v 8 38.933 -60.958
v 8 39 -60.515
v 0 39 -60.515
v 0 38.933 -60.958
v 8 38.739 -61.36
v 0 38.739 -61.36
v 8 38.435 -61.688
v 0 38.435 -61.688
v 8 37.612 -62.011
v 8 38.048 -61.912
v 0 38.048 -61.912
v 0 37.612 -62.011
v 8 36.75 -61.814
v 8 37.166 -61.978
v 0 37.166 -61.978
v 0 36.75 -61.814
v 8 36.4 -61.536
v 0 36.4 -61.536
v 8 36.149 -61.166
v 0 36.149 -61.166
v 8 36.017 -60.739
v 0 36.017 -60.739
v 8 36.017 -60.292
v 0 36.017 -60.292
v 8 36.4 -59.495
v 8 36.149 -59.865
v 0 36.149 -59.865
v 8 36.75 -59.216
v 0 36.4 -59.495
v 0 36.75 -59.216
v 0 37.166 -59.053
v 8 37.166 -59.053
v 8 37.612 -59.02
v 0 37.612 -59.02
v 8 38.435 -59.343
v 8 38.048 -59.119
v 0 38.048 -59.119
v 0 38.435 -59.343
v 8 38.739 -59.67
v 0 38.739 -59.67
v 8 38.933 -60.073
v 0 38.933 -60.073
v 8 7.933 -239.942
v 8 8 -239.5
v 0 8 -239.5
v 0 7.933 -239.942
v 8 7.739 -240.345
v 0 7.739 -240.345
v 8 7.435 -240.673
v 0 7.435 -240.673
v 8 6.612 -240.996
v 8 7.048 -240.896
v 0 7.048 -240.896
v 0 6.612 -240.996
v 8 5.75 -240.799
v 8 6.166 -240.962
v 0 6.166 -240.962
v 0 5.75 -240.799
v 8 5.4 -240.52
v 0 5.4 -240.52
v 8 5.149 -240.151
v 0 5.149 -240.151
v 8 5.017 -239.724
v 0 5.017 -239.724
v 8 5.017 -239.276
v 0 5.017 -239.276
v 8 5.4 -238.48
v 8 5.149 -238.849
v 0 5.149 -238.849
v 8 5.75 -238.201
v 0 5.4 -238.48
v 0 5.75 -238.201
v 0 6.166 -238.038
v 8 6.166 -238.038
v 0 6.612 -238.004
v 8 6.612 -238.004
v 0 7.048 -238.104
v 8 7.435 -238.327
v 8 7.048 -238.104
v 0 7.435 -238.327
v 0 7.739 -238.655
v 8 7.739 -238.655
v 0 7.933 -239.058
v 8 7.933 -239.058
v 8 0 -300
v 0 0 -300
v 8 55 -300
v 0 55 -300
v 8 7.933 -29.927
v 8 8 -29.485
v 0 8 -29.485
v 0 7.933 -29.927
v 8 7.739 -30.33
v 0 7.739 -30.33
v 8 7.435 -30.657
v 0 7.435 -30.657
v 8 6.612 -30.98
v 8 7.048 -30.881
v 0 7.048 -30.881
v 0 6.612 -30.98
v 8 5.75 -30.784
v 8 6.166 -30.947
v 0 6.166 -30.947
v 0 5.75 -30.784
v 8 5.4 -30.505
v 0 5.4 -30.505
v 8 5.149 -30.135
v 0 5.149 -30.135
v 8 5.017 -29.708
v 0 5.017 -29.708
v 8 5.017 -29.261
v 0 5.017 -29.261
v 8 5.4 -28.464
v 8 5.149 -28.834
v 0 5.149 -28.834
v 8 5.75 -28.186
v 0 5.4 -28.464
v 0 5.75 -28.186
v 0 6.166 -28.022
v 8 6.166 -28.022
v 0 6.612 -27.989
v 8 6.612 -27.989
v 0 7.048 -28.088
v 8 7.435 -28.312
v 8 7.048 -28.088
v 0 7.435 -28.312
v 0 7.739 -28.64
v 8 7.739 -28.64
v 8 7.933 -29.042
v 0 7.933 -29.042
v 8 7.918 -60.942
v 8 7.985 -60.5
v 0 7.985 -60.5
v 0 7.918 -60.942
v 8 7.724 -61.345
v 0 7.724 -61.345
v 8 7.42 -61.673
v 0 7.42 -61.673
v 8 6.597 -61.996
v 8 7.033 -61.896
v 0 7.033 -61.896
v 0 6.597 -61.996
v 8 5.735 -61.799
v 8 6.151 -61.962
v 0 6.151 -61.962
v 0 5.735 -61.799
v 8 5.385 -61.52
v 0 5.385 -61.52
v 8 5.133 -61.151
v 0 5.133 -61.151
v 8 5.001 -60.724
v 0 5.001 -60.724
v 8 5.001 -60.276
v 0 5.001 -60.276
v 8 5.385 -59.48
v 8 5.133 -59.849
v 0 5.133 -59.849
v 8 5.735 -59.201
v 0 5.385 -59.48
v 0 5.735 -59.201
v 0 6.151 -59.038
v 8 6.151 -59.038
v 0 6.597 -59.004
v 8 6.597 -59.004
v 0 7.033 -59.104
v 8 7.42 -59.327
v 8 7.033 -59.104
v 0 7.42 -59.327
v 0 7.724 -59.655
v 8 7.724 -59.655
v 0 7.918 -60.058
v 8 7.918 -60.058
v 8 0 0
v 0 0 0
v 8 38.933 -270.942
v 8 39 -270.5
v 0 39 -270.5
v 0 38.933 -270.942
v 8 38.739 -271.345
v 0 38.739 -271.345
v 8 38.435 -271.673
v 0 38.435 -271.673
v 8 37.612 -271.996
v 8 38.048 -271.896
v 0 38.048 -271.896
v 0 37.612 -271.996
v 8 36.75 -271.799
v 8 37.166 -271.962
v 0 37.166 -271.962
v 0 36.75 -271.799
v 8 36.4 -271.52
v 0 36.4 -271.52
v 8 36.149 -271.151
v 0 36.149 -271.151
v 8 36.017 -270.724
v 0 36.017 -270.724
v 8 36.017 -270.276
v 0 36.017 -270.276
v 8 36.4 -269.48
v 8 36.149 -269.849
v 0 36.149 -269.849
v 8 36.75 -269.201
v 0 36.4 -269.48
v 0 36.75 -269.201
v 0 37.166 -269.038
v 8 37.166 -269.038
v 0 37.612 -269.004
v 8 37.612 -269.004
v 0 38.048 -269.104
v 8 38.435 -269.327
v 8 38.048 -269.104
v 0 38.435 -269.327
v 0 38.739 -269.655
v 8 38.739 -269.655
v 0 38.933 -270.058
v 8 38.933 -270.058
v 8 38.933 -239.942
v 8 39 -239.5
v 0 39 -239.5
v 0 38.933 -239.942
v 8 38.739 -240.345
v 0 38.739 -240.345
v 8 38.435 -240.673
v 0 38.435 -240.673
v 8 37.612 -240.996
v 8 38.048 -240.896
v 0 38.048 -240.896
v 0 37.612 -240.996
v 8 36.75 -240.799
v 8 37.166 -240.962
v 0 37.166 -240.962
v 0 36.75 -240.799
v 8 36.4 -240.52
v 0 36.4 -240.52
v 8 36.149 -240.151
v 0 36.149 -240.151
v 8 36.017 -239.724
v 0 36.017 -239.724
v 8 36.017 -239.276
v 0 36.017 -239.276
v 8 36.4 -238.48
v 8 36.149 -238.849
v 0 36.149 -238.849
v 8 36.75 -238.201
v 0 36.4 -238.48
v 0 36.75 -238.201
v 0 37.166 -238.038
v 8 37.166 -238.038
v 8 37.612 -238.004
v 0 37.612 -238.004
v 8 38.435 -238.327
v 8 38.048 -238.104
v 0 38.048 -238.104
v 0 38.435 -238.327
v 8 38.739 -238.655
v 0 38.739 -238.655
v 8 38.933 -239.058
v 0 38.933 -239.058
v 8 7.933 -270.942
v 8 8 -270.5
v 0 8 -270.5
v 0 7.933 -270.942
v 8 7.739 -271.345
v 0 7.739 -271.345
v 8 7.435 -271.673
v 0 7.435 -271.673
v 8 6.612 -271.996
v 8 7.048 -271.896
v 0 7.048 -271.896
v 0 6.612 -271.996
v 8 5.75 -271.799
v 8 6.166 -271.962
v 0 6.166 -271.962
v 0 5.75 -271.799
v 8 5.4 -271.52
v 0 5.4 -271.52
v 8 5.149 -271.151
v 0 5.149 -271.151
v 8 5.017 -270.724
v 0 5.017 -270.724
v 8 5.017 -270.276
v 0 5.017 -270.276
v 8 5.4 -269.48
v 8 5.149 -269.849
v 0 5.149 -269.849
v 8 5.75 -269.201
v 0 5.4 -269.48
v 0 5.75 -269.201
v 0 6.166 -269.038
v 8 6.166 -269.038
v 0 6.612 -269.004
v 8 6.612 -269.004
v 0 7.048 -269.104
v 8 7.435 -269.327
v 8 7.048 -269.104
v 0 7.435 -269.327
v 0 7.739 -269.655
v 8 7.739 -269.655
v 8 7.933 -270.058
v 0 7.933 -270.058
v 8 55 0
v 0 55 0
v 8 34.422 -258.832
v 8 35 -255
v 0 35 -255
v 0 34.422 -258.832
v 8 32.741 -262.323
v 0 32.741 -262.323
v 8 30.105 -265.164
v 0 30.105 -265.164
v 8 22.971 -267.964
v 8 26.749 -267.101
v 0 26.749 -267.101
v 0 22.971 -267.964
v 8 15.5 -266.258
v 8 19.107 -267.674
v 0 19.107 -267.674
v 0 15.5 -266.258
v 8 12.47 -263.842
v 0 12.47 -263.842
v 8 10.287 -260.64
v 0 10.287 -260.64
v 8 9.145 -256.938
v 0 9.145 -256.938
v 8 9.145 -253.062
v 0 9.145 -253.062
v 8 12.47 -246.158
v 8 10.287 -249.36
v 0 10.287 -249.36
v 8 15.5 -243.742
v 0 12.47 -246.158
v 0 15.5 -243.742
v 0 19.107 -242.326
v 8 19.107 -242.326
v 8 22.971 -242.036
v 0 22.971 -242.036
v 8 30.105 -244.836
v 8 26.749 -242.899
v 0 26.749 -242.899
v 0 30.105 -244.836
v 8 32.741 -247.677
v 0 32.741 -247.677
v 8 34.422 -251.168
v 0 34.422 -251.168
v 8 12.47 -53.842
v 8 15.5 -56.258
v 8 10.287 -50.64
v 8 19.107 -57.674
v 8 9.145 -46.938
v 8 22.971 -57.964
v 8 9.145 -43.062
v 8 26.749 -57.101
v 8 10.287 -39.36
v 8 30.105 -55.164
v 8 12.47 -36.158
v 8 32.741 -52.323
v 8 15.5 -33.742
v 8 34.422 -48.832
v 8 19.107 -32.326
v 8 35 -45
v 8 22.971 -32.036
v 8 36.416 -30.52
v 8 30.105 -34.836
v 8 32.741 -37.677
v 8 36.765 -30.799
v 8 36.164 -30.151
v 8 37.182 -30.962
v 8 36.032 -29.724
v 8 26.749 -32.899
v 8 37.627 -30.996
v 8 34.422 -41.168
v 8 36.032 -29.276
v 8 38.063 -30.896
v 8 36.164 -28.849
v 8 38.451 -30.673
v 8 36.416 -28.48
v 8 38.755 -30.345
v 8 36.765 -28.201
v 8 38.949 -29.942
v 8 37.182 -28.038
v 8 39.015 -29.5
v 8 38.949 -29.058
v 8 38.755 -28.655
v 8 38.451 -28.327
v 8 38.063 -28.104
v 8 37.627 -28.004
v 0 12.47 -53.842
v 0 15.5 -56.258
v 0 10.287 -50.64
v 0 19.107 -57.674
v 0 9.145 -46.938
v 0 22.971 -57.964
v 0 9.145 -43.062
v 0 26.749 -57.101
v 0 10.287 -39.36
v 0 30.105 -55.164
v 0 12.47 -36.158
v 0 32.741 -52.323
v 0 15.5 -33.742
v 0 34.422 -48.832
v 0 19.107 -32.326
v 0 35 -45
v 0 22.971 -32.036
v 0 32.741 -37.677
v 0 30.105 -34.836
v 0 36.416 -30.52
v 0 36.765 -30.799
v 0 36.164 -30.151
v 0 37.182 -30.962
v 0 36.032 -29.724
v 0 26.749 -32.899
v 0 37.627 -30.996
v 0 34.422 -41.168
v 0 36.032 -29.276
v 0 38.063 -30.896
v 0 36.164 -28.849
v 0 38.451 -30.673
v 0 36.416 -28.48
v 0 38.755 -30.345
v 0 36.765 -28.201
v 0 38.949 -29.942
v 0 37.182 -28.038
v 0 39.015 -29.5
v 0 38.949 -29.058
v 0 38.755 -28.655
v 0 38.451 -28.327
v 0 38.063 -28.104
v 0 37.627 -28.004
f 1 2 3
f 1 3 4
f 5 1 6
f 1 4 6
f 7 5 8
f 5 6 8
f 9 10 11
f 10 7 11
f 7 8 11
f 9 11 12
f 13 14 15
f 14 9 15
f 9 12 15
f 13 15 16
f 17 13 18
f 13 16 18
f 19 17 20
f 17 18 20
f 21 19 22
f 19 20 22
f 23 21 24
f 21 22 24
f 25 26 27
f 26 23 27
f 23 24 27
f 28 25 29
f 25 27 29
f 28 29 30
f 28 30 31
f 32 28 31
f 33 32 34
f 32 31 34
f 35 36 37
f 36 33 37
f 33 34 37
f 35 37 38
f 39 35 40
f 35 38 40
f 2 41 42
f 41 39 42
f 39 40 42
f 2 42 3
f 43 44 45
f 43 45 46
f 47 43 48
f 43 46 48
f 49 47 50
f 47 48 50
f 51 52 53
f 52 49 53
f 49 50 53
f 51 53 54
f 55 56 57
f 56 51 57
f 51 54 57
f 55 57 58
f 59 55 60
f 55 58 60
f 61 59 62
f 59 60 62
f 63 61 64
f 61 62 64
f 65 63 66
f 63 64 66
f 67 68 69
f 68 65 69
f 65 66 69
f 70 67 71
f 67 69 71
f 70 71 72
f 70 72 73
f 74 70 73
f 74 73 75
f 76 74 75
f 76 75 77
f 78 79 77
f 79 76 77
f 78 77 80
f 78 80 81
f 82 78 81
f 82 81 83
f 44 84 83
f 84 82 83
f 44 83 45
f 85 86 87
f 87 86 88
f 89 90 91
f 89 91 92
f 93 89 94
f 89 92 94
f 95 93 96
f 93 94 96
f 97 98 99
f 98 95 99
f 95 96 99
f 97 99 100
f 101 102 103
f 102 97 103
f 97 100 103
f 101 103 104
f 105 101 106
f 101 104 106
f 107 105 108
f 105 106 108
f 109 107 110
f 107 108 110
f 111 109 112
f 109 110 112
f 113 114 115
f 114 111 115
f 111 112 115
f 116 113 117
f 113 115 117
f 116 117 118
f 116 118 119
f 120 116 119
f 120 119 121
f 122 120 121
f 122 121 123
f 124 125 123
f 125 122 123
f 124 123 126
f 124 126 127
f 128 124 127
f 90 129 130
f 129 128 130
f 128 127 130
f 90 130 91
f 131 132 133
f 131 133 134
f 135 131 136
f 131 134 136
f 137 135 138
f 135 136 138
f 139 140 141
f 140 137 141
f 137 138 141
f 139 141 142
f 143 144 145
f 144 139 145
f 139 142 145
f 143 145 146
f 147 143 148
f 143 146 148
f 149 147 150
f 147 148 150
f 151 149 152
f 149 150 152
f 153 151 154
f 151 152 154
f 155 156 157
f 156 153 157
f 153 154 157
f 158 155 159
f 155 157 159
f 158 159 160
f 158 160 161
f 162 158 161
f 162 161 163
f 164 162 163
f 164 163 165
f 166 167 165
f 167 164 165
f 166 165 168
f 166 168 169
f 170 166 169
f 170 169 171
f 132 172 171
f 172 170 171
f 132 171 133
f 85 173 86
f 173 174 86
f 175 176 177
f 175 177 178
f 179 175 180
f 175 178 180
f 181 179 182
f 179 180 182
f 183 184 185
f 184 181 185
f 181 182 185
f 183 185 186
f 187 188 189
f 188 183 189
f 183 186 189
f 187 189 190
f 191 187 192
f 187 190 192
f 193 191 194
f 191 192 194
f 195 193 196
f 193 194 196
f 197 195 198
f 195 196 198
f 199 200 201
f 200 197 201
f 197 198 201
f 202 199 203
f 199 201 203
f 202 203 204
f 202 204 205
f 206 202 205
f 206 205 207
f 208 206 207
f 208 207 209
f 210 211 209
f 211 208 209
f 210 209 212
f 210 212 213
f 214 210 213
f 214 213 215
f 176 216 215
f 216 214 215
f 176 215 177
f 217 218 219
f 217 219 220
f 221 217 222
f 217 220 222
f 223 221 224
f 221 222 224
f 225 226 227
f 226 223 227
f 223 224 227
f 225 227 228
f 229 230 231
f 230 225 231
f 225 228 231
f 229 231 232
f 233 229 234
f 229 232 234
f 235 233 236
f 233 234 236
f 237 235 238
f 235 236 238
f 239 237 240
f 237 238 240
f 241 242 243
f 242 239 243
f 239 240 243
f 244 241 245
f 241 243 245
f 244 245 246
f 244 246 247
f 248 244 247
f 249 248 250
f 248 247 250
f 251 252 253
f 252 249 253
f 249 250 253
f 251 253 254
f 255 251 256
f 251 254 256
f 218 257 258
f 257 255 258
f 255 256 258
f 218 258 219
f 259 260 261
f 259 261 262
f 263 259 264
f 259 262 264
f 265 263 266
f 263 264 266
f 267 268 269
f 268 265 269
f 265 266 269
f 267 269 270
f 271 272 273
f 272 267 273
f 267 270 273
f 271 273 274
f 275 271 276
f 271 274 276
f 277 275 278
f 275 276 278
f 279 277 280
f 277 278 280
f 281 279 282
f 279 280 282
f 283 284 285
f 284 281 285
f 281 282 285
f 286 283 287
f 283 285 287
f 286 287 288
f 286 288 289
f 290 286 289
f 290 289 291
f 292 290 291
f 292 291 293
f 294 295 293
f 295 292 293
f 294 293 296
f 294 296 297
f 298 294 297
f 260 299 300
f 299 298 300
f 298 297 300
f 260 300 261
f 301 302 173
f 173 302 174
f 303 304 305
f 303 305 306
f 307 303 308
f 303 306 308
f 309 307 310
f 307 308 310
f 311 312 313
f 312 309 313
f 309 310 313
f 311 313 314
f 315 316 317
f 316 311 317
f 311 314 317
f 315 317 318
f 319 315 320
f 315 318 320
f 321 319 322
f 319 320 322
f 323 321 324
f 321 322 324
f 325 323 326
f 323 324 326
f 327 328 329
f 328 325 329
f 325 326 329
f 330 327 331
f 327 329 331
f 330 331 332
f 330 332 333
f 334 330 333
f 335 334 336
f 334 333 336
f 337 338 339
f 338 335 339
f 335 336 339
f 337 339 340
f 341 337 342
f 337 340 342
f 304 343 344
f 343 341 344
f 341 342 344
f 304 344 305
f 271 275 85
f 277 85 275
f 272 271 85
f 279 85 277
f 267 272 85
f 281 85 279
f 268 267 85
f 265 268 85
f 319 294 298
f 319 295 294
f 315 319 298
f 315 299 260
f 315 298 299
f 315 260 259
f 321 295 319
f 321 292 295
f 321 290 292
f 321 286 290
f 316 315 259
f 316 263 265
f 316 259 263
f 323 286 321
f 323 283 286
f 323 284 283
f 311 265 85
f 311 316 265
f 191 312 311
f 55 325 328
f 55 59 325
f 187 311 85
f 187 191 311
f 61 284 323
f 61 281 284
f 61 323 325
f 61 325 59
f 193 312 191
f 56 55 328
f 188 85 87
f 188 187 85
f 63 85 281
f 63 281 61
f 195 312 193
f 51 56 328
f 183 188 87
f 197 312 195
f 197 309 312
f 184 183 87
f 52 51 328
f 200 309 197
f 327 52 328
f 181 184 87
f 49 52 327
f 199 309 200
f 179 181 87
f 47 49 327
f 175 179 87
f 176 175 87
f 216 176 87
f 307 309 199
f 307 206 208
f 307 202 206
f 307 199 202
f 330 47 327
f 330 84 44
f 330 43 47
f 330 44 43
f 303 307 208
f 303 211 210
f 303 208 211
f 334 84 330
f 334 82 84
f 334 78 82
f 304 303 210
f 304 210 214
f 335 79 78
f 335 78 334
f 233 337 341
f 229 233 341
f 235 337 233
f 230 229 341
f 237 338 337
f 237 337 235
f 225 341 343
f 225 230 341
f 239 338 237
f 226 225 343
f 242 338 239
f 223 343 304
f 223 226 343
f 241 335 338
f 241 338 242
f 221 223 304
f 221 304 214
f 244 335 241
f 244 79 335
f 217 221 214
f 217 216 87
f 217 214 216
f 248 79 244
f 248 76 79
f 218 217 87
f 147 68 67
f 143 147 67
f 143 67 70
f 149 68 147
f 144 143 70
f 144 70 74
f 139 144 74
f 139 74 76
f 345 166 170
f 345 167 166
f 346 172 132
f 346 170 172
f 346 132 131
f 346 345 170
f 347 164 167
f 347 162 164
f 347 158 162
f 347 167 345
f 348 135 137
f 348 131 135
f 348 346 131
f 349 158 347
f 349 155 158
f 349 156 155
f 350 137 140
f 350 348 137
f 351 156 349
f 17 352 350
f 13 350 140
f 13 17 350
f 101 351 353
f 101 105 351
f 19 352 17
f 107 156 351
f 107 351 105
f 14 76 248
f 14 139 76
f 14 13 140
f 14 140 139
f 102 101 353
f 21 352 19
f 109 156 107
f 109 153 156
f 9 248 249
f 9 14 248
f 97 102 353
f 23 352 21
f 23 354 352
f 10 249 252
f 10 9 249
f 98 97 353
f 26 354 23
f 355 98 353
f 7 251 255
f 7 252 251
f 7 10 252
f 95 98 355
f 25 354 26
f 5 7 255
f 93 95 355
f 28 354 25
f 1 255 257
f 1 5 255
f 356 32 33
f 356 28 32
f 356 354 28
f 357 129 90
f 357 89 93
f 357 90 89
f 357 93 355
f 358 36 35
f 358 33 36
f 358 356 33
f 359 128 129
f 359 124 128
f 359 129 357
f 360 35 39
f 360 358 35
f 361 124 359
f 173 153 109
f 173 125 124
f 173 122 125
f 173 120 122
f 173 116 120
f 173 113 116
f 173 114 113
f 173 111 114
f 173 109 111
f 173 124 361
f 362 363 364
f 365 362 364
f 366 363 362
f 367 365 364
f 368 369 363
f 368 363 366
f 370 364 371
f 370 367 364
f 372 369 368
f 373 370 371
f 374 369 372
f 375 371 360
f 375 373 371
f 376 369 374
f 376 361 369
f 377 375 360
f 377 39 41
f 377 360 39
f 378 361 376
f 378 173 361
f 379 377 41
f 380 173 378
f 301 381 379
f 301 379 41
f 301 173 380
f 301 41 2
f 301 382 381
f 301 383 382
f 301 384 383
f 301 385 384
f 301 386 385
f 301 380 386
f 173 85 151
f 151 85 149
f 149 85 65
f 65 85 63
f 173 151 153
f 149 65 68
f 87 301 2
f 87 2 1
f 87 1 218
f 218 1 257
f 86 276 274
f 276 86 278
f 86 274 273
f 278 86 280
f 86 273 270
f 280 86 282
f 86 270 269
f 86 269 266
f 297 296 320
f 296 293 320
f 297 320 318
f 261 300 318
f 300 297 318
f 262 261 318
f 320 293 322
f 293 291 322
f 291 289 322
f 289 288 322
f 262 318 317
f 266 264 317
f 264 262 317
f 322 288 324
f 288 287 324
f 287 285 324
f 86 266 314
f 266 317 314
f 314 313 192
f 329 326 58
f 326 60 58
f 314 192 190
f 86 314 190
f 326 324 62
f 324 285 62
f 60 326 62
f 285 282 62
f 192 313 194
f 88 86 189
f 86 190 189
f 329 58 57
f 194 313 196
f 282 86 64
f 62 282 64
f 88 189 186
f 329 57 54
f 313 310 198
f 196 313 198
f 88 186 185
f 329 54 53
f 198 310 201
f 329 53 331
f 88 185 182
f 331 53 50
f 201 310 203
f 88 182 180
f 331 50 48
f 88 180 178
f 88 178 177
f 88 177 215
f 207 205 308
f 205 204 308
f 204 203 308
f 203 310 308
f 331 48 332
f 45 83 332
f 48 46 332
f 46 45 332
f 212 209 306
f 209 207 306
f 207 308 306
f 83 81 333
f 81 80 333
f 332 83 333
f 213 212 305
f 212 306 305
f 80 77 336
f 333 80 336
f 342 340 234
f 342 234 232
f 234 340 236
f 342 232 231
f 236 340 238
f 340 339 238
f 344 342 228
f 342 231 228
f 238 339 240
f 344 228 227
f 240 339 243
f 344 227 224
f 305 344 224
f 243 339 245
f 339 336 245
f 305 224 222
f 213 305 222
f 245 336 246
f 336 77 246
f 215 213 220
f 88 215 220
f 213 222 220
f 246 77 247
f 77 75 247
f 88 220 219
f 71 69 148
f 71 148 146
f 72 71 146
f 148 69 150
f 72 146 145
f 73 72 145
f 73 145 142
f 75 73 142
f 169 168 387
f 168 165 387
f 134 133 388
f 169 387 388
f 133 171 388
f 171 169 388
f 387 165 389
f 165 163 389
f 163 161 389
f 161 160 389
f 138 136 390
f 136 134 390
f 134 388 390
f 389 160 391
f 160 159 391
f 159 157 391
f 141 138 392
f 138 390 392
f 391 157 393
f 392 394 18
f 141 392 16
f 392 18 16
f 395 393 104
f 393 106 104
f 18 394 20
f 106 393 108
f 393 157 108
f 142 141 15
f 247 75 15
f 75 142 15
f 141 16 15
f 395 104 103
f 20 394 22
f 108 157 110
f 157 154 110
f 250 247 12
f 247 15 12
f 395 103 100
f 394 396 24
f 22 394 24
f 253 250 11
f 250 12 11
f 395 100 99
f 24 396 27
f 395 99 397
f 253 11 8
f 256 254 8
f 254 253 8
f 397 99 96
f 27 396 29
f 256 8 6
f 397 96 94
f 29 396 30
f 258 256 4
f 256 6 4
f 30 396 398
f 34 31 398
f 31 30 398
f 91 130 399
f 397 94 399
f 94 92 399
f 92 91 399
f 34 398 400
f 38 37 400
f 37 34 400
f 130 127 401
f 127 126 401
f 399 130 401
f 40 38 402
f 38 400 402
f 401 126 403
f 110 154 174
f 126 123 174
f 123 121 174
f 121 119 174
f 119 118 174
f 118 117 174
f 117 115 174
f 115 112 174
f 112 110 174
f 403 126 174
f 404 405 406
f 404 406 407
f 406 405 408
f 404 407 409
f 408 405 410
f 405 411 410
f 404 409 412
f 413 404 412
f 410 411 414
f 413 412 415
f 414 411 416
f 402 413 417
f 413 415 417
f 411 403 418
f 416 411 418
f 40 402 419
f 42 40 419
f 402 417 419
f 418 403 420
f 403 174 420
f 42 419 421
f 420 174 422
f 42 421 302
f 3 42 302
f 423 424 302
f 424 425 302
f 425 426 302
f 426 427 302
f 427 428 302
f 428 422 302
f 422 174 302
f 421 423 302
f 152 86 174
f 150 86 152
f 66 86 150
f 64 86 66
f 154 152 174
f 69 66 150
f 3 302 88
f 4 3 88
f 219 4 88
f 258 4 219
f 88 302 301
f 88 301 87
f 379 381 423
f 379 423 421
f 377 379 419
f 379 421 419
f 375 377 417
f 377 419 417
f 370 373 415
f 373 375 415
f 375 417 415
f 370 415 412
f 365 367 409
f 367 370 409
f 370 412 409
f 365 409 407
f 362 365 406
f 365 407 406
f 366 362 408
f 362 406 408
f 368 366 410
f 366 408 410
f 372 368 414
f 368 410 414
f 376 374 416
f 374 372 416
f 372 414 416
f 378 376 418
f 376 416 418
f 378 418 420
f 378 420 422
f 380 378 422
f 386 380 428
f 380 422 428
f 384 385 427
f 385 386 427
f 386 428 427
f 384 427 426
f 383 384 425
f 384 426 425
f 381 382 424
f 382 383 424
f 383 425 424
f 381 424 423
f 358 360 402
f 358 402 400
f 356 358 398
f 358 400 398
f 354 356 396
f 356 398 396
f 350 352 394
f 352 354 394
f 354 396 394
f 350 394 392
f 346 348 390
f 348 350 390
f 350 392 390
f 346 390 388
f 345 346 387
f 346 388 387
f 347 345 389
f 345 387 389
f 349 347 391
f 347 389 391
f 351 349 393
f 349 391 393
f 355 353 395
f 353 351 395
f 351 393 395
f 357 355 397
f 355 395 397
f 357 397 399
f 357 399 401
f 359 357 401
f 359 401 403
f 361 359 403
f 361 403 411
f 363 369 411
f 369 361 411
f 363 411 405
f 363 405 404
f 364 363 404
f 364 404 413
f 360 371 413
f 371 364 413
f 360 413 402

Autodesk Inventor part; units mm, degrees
ref_plane "YZ Plane" through (0, 0, 0) normal (1, 0, 0) x (0, 1, 0)
ref_plane "XZ Plane" through (0, 0, 0) normal (0, 1, 0) x (-1, 0, 0)
ref_plane "XY Plane" through (0, 0, 0) normal (0, 0, 1) x (1, 0, 0)
sketch "Szkic1" plane through (0, 0, 0) normal (1, 0, 0) x (0, 1, 0)
  line L0 (0, -300) -> (55, -300)
  line L1 (55, 0) -> (0, 0)
  line L2 (55, 0) -> (55, -300)
  circle A0 centre (22, -45) radius 13
  circle A1 centre (22, -255) radius 13
  line L3 (0, 0) -> (0, -300)
  circle A2 centre (37.5154, -29.5) radius 1.5
  circle A3 centre (6.5, -29.4846) radius 1.5
  circle A4 centre (6.4846, -60.5) radius 1.5
  circle A5 centre (37.5, -60.5154) radius 1.5
  circle A6 centre (6.5, -270.5) radius 1.5
  circle A7 centre (37.5, -270.5) radius 1.5
  circle A8 centre (37.5, -239.5) radius 1.5
  circle A9 centre (6.5, -239.5) radius 1.5
  dimension "d0" = 300
  dimension "d1" = 55
  dimension "d2" = 300
  dimension "d5" = 26
  dimension "d8" = 26
  dimension "d9" = 3
  dimension "d12" = 360
  dimension "d14" = 3
  dimension "d17" = 360
extrude "Wyciągnięcie proste1" add sketch "Szkic1" along normal blind 8
properties part number "bok"
